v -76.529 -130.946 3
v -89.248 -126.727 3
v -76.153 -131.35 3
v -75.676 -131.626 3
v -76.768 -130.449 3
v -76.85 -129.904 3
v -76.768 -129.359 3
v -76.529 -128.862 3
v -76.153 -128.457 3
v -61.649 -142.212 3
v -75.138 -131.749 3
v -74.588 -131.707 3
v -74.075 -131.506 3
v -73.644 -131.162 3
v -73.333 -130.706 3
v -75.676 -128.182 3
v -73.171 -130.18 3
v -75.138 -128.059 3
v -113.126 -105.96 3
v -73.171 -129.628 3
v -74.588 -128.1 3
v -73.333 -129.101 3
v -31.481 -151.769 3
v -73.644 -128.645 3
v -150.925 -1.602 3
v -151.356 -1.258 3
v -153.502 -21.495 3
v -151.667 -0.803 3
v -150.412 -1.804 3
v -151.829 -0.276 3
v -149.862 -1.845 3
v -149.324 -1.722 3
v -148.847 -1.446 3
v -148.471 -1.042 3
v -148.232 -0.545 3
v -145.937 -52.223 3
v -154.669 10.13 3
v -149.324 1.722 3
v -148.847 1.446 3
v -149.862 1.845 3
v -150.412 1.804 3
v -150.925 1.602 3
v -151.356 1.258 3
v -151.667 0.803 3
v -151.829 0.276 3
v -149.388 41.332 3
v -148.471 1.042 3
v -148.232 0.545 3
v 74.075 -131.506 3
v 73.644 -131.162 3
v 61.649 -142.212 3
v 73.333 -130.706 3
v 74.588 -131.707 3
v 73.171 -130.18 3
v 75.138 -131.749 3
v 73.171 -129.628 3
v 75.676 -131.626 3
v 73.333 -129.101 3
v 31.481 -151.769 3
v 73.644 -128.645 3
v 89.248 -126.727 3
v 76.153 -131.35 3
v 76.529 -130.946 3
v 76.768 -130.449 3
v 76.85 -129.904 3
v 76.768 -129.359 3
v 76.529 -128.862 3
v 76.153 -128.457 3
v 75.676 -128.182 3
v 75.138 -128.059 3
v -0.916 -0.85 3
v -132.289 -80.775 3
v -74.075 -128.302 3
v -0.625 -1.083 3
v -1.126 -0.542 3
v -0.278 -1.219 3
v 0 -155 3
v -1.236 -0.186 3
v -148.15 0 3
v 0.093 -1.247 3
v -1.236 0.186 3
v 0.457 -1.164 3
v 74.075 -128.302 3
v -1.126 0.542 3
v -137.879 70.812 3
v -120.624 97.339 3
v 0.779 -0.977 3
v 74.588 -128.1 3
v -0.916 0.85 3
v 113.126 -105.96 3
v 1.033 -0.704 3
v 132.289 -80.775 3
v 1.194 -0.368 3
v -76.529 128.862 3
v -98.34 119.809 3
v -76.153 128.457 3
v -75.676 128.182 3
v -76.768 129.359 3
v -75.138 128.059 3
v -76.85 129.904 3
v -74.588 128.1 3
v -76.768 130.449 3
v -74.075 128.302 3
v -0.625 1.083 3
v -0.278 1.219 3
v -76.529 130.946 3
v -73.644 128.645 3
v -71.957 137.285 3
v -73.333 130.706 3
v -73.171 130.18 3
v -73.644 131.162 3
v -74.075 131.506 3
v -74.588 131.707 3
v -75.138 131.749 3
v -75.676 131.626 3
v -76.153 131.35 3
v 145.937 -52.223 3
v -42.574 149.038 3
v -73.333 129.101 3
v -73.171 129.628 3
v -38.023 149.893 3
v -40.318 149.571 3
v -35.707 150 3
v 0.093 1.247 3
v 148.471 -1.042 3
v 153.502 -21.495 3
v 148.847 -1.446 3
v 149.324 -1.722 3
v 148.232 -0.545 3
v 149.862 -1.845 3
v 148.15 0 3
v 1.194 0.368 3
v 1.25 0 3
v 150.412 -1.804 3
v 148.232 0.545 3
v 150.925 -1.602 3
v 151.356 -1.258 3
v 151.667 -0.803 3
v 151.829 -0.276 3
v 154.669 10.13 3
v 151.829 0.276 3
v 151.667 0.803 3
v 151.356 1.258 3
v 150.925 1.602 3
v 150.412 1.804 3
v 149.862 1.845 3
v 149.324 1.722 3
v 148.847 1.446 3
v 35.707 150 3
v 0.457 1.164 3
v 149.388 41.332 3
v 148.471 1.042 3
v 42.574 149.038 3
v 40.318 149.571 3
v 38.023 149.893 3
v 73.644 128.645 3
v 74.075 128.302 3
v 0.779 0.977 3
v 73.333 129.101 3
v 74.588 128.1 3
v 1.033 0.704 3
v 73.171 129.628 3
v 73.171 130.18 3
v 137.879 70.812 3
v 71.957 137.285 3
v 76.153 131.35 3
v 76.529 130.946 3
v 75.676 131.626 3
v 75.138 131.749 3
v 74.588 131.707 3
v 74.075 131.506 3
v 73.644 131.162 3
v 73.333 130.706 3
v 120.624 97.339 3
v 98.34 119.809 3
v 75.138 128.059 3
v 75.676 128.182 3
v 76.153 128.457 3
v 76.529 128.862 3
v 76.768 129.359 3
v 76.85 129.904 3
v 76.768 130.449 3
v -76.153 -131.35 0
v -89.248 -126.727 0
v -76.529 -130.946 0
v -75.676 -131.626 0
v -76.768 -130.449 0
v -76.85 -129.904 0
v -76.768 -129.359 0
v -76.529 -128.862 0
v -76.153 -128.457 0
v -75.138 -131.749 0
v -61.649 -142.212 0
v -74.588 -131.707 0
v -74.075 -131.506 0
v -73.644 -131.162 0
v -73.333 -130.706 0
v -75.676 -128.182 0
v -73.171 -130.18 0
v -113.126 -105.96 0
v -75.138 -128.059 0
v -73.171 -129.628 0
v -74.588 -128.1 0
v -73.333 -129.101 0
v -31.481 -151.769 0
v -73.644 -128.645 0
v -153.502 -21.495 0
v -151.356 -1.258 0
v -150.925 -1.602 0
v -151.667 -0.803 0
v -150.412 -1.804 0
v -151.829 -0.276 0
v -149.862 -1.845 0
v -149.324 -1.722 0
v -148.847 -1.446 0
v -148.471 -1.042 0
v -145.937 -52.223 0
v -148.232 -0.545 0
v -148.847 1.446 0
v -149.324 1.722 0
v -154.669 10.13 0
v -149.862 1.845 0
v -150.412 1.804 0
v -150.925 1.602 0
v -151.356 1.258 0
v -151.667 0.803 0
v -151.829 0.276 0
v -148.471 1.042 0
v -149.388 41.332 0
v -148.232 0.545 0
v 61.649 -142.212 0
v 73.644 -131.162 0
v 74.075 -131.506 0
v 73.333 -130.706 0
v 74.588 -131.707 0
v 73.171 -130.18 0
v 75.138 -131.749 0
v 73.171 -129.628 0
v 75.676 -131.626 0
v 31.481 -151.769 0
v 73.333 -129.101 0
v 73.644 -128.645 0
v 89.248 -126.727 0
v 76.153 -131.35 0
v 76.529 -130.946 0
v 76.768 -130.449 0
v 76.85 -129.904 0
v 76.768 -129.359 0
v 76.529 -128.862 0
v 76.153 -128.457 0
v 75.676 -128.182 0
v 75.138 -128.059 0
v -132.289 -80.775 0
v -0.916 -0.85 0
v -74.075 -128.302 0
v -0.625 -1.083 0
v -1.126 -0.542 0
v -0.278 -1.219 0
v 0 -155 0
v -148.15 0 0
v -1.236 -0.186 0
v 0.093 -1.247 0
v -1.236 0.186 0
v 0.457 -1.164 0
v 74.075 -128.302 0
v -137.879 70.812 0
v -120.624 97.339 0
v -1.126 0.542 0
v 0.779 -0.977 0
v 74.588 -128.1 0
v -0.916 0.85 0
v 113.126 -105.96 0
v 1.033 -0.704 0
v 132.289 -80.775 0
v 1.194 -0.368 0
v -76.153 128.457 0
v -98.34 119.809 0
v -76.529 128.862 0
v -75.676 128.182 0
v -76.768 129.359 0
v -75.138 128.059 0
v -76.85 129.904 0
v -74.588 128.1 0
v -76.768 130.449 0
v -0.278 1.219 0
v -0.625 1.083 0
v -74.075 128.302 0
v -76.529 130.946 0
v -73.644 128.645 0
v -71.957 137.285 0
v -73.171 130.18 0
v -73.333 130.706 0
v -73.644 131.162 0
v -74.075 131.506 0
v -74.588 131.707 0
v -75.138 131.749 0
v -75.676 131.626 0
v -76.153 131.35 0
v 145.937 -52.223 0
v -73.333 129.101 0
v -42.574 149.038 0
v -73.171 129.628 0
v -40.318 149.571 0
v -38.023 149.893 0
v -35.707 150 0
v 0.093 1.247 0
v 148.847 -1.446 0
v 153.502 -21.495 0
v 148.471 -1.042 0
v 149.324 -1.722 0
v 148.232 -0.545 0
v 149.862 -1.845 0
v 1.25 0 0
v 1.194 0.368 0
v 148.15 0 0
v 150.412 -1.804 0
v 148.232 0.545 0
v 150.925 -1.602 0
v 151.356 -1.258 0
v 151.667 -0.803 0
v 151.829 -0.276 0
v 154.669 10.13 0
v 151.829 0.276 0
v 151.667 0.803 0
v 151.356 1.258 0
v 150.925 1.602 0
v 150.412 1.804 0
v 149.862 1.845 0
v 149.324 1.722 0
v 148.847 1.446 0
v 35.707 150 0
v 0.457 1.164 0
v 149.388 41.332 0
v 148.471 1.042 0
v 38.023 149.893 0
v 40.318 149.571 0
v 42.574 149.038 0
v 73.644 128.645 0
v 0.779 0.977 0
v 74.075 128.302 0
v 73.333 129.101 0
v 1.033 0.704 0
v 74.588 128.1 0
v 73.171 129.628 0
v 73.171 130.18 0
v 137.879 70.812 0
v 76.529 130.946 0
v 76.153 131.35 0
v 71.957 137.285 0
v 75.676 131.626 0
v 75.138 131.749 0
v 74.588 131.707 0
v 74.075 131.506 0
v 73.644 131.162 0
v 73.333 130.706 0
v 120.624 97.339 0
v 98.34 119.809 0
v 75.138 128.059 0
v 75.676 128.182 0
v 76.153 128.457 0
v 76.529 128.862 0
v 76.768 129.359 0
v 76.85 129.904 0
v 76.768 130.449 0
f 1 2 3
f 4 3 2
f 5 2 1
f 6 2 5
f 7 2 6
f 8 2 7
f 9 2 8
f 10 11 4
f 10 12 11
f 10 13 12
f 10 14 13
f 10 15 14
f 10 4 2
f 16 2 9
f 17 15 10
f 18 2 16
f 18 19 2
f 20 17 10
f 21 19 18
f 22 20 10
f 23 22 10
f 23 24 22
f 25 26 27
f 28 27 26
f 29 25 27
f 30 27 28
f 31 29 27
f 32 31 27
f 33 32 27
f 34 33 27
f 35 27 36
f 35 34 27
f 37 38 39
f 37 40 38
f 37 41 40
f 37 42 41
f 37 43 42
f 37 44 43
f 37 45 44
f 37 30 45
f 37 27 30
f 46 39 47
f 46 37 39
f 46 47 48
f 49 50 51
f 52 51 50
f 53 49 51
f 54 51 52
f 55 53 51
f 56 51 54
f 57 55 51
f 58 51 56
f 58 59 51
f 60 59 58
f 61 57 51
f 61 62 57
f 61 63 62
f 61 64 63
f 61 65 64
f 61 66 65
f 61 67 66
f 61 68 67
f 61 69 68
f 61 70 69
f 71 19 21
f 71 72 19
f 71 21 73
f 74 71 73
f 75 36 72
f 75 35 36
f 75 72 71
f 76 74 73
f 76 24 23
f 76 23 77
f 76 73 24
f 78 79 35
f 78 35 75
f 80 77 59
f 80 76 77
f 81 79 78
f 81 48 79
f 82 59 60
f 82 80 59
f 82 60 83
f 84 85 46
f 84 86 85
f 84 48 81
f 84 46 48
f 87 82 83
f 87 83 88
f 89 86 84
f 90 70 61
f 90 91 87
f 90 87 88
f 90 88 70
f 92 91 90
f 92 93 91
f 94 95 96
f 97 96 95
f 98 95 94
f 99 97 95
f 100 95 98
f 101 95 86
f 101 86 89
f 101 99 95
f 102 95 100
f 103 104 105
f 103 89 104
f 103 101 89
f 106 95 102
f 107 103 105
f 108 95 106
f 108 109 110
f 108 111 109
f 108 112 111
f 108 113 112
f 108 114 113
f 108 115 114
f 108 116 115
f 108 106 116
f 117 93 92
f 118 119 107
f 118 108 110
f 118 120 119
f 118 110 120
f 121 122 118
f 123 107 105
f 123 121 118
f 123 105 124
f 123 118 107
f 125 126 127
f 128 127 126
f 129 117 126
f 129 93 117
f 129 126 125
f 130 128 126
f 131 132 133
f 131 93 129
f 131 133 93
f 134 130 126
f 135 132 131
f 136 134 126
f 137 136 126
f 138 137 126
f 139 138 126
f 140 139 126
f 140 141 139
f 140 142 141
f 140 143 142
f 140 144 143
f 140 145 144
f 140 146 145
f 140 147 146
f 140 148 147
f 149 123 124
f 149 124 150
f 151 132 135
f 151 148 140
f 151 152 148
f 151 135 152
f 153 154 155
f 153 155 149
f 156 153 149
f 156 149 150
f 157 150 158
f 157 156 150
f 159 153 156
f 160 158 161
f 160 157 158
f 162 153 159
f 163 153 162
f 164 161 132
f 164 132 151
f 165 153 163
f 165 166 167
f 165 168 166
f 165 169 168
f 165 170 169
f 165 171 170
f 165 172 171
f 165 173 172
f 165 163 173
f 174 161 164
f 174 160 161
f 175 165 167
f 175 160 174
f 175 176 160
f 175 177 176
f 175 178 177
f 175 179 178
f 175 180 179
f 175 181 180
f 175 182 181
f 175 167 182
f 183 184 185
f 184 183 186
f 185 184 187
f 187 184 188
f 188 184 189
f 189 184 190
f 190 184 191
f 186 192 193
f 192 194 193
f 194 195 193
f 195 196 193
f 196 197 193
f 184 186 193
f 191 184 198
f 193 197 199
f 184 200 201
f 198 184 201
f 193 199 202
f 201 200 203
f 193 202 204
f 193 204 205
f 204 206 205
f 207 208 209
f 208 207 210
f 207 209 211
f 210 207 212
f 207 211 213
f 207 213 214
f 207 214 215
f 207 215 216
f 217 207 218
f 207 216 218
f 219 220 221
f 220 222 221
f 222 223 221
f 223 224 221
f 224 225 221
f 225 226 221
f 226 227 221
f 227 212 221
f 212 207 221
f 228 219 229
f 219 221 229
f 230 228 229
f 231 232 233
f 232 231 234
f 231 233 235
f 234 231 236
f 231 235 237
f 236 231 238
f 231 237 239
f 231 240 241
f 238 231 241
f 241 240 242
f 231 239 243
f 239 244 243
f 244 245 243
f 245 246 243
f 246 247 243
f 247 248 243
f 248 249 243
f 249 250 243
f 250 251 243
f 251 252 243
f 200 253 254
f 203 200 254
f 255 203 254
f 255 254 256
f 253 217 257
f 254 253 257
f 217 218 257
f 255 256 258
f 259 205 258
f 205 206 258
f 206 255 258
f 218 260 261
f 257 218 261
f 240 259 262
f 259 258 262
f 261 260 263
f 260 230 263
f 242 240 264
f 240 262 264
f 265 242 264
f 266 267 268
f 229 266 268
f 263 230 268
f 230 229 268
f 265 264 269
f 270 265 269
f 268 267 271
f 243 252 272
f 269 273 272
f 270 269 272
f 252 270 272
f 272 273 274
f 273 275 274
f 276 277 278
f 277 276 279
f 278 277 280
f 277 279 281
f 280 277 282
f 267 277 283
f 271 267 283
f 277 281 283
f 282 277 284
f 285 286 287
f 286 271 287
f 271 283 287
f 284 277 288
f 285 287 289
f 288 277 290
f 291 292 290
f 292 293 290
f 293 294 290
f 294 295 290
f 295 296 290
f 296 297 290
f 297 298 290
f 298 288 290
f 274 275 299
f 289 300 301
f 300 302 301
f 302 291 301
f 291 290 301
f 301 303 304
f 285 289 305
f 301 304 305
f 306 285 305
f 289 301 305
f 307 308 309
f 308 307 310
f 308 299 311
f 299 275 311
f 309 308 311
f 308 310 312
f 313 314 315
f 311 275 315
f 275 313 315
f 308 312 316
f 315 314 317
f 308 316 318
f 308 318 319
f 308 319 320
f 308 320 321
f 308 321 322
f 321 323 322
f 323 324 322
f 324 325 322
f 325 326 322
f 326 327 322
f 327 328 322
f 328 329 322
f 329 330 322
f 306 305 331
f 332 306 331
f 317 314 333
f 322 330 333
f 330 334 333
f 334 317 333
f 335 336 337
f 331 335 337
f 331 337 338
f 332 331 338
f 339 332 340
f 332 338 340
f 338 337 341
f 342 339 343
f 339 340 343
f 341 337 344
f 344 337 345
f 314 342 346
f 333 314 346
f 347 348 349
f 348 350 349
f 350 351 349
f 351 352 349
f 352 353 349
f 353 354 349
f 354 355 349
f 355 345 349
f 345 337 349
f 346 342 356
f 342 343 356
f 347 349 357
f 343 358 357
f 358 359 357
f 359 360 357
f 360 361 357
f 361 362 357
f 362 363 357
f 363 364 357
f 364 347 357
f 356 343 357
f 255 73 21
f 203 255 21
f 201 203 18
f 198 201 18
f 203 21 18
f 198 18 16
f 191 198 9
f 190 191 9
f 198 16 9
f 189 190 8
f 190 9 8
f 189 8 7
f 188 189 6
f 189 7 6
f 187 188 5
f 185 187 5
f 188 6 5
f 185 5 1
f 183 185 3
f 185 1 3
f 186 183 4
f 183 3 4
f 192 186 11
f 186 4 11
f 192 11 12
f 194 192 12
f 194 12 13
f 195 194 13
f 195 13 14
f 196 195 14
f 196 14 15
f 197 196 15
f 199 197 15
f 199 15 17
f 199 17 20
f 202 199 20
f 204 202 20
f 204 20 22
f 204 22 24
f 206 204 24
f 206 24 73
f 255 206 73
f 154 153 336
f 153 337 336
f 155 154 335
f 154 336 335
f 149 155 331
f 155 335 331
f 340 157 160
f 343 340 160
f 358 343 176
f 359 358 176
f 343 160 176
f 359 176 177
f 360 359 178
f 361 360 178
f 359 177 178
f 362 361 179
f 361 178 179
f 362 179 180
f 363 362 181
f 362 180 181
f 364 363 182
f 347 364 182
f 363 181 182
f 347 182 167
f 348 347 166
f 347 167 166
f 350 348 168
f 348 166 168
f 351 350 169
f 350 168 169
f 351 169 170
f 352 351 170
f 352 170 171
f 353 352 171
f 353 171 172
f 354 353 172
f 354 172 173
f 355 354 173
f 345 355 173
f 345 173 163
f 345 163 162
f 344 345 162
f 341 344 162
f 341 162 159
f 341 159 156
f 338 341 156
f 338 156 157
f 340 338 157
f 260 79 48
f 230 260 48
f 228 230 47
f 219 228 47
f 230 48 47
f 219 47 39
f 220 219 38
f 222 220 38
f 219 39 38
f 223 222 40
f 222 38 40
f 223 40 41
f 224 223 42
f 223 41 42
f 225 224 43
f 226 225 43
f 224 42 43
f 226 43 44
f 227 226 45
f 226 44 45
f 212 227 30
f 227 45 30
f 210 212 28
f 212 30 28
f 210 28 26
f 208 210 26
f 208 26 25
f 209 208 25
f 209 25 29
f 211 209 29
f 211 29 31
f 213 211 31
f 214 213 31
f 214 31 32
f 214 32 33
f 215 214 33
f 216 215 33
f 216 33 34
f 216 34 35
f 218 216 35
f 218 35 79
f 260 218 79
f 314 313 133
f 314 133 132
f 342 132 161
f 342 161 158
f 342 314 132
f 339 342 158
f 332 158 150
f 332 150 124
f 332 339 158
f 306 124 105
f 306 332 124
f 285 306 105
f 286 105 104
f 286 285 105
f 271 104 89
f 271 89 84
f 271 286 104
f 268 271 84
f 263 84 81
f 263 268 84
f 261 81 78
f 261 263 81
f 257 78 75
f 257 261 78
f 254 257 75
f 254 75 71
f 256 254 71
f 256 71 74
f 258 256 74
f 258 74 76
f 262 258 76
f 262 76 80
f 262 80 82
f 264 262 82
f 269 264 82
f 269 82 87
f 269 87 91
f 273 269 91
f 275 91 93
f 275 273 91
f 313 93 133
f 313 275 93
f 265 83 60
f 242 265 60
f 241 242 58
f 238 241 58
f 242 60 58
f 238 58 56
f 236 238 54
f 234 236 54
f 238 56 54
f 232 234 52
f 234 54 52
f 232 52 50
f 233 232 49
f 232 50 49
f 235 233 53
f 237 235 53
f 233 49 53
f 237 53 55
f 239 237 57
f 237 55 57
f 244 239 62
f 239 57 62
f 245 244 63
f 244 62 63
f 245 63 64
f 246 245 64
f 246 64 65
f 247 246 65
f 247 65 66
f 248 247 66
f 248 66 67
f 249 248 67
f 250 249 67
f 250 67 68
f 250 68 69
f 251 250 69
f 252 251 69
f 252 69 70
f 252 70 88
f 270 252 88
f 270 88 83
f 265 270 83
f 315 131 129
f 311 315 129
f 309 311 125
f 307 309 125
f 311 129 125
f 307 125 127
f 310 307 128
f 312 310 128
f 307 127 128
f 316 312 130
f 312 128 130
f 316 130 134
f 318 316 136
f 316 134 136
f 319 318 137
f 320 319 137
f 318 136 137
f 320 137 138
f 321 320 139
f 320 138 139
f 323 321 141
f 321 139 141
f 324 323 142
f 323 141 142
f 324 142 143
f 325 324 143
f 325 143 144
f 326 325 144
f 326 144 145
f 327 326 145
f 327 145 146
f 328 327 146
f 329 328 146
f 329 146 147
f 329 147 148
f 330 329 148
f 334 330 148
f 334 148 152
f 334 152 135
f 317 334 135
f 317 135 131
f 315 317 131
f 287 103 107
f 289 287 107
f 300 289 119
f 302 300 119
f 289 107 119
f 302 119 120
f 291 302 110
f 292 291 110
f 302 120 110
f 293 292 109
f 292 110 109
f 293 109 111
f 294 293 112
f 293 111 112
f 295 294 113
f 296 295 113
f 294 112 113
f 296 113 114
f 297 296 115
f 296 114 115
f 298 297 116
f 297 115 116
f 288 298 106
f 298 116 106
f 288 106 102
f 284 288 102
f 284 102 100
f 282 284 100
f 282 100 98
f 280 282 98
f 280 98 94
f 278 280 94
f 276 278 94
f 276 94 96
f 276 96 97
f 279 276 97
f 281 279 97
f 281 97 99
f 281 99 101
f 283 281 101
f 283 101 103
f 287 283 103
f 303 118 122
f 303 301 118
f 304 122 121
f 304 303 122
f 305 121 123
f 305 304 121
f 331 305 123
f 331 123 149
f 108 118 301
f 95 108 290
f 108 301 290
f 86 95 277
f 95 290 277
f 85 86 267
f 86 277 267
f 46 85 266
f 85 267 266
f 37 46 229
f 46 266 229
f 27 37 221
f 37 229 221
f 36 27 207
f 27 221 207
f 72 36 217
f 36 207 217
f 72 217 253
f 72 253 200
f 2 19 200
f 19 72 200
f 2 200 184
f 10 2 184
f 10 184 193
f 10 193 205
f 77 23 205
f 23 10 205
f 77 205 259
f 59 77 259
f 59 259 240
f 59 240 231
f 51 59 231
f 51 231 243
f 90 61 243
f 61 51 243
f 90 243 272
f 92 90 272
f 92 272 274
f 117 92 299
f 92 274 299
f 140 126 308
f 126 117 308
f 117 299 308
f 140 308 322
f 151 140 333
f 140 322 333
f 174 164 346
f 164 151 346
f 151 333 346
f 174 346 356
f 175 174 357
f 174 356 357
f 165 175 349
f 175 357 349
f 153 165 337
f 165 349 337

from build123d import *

# Parameters (mm, degrees)
SKETCH1_R               = 155
SKETCH1_R_2             = 1.25
BOSS_EXTRUDE1_DEPTH     = 3
SKETCH2_R               = 1.85
CUT_EXTRUDE1_DEPTH      = 220.223630113
CIRPATTERN1_COUNT       = 6
CUT_EXTRUDE2_DEPTH      = 220.223630113
CUT_EXTRUDE2_DEPTH_BACK = 220.223630113
FILLET1_R               = 25


with BuildPart() as part:
    # Sketch1 → Boss-Extrude1 (new body)
    with BuildSketch(Plane.XY):
        Circle(SKETCH1_R)
        Circle(SKETCH1_R_2, mode=Mode.SUBTRACT)
    extrude(amount=BOSS_EXTRUDE1_DEPTH)

    # Sketch2 → Cut-Extrude1 (cut, through all)
    with BuildSketch(Plane.XY.offset(3)):
        with Locations((-150, 0)):
            Circle(SKETCH2_R)
    cut_extrude1 = extrude(amount=-CUT_EXTRUDE1_DEPTH, mode=Mode.SUBTRACT)

    # CirPattern1: Cut-Extrude1 ×6 about axis
    cirpattern1_axis = Axis((0, 0, 3), (0, 0, 1))
    for i in range(1, CIRPATTERN1_COUNT):
        add(cut_extrude1.rotate(cirpattern1_axis, i * 360 / CIRPATTERN1_COUNT), mode=Mode.SUBTRACT)

    # Sketch18 → Cut-Extrude2 (cut, two sides: drawn at the far end of the back side and taken through both)
    with BuildSketch(Plane.XY.offset(3).offset(-CUT_EXTRUDE2_DEPTH_BACK)):
        Polygon((-816.796213875, 150), (-60.219206673, 150), (46.353365048, 150), (802.93037225, 150), (802.93037225, 1663.154014405), (-816.796213875, 1663.154014405), align=None)
    extrude(amount=CUT_EXTRUDE2_DEPTH + CUT_EXTRUDE2_DEPTH_BACK, mode=Mode.SUBTRACT)

    # Fillet1
    fillet1_edges = [part.edges().sort_by_distance(p)[0] for p in [
        (39.05124838, 150, 1.5),
        (-39.05124838, 150, 1.5),
    ]]
    fillet(fillet1_edges, radius=FILLET1_R)


solid = part.part
